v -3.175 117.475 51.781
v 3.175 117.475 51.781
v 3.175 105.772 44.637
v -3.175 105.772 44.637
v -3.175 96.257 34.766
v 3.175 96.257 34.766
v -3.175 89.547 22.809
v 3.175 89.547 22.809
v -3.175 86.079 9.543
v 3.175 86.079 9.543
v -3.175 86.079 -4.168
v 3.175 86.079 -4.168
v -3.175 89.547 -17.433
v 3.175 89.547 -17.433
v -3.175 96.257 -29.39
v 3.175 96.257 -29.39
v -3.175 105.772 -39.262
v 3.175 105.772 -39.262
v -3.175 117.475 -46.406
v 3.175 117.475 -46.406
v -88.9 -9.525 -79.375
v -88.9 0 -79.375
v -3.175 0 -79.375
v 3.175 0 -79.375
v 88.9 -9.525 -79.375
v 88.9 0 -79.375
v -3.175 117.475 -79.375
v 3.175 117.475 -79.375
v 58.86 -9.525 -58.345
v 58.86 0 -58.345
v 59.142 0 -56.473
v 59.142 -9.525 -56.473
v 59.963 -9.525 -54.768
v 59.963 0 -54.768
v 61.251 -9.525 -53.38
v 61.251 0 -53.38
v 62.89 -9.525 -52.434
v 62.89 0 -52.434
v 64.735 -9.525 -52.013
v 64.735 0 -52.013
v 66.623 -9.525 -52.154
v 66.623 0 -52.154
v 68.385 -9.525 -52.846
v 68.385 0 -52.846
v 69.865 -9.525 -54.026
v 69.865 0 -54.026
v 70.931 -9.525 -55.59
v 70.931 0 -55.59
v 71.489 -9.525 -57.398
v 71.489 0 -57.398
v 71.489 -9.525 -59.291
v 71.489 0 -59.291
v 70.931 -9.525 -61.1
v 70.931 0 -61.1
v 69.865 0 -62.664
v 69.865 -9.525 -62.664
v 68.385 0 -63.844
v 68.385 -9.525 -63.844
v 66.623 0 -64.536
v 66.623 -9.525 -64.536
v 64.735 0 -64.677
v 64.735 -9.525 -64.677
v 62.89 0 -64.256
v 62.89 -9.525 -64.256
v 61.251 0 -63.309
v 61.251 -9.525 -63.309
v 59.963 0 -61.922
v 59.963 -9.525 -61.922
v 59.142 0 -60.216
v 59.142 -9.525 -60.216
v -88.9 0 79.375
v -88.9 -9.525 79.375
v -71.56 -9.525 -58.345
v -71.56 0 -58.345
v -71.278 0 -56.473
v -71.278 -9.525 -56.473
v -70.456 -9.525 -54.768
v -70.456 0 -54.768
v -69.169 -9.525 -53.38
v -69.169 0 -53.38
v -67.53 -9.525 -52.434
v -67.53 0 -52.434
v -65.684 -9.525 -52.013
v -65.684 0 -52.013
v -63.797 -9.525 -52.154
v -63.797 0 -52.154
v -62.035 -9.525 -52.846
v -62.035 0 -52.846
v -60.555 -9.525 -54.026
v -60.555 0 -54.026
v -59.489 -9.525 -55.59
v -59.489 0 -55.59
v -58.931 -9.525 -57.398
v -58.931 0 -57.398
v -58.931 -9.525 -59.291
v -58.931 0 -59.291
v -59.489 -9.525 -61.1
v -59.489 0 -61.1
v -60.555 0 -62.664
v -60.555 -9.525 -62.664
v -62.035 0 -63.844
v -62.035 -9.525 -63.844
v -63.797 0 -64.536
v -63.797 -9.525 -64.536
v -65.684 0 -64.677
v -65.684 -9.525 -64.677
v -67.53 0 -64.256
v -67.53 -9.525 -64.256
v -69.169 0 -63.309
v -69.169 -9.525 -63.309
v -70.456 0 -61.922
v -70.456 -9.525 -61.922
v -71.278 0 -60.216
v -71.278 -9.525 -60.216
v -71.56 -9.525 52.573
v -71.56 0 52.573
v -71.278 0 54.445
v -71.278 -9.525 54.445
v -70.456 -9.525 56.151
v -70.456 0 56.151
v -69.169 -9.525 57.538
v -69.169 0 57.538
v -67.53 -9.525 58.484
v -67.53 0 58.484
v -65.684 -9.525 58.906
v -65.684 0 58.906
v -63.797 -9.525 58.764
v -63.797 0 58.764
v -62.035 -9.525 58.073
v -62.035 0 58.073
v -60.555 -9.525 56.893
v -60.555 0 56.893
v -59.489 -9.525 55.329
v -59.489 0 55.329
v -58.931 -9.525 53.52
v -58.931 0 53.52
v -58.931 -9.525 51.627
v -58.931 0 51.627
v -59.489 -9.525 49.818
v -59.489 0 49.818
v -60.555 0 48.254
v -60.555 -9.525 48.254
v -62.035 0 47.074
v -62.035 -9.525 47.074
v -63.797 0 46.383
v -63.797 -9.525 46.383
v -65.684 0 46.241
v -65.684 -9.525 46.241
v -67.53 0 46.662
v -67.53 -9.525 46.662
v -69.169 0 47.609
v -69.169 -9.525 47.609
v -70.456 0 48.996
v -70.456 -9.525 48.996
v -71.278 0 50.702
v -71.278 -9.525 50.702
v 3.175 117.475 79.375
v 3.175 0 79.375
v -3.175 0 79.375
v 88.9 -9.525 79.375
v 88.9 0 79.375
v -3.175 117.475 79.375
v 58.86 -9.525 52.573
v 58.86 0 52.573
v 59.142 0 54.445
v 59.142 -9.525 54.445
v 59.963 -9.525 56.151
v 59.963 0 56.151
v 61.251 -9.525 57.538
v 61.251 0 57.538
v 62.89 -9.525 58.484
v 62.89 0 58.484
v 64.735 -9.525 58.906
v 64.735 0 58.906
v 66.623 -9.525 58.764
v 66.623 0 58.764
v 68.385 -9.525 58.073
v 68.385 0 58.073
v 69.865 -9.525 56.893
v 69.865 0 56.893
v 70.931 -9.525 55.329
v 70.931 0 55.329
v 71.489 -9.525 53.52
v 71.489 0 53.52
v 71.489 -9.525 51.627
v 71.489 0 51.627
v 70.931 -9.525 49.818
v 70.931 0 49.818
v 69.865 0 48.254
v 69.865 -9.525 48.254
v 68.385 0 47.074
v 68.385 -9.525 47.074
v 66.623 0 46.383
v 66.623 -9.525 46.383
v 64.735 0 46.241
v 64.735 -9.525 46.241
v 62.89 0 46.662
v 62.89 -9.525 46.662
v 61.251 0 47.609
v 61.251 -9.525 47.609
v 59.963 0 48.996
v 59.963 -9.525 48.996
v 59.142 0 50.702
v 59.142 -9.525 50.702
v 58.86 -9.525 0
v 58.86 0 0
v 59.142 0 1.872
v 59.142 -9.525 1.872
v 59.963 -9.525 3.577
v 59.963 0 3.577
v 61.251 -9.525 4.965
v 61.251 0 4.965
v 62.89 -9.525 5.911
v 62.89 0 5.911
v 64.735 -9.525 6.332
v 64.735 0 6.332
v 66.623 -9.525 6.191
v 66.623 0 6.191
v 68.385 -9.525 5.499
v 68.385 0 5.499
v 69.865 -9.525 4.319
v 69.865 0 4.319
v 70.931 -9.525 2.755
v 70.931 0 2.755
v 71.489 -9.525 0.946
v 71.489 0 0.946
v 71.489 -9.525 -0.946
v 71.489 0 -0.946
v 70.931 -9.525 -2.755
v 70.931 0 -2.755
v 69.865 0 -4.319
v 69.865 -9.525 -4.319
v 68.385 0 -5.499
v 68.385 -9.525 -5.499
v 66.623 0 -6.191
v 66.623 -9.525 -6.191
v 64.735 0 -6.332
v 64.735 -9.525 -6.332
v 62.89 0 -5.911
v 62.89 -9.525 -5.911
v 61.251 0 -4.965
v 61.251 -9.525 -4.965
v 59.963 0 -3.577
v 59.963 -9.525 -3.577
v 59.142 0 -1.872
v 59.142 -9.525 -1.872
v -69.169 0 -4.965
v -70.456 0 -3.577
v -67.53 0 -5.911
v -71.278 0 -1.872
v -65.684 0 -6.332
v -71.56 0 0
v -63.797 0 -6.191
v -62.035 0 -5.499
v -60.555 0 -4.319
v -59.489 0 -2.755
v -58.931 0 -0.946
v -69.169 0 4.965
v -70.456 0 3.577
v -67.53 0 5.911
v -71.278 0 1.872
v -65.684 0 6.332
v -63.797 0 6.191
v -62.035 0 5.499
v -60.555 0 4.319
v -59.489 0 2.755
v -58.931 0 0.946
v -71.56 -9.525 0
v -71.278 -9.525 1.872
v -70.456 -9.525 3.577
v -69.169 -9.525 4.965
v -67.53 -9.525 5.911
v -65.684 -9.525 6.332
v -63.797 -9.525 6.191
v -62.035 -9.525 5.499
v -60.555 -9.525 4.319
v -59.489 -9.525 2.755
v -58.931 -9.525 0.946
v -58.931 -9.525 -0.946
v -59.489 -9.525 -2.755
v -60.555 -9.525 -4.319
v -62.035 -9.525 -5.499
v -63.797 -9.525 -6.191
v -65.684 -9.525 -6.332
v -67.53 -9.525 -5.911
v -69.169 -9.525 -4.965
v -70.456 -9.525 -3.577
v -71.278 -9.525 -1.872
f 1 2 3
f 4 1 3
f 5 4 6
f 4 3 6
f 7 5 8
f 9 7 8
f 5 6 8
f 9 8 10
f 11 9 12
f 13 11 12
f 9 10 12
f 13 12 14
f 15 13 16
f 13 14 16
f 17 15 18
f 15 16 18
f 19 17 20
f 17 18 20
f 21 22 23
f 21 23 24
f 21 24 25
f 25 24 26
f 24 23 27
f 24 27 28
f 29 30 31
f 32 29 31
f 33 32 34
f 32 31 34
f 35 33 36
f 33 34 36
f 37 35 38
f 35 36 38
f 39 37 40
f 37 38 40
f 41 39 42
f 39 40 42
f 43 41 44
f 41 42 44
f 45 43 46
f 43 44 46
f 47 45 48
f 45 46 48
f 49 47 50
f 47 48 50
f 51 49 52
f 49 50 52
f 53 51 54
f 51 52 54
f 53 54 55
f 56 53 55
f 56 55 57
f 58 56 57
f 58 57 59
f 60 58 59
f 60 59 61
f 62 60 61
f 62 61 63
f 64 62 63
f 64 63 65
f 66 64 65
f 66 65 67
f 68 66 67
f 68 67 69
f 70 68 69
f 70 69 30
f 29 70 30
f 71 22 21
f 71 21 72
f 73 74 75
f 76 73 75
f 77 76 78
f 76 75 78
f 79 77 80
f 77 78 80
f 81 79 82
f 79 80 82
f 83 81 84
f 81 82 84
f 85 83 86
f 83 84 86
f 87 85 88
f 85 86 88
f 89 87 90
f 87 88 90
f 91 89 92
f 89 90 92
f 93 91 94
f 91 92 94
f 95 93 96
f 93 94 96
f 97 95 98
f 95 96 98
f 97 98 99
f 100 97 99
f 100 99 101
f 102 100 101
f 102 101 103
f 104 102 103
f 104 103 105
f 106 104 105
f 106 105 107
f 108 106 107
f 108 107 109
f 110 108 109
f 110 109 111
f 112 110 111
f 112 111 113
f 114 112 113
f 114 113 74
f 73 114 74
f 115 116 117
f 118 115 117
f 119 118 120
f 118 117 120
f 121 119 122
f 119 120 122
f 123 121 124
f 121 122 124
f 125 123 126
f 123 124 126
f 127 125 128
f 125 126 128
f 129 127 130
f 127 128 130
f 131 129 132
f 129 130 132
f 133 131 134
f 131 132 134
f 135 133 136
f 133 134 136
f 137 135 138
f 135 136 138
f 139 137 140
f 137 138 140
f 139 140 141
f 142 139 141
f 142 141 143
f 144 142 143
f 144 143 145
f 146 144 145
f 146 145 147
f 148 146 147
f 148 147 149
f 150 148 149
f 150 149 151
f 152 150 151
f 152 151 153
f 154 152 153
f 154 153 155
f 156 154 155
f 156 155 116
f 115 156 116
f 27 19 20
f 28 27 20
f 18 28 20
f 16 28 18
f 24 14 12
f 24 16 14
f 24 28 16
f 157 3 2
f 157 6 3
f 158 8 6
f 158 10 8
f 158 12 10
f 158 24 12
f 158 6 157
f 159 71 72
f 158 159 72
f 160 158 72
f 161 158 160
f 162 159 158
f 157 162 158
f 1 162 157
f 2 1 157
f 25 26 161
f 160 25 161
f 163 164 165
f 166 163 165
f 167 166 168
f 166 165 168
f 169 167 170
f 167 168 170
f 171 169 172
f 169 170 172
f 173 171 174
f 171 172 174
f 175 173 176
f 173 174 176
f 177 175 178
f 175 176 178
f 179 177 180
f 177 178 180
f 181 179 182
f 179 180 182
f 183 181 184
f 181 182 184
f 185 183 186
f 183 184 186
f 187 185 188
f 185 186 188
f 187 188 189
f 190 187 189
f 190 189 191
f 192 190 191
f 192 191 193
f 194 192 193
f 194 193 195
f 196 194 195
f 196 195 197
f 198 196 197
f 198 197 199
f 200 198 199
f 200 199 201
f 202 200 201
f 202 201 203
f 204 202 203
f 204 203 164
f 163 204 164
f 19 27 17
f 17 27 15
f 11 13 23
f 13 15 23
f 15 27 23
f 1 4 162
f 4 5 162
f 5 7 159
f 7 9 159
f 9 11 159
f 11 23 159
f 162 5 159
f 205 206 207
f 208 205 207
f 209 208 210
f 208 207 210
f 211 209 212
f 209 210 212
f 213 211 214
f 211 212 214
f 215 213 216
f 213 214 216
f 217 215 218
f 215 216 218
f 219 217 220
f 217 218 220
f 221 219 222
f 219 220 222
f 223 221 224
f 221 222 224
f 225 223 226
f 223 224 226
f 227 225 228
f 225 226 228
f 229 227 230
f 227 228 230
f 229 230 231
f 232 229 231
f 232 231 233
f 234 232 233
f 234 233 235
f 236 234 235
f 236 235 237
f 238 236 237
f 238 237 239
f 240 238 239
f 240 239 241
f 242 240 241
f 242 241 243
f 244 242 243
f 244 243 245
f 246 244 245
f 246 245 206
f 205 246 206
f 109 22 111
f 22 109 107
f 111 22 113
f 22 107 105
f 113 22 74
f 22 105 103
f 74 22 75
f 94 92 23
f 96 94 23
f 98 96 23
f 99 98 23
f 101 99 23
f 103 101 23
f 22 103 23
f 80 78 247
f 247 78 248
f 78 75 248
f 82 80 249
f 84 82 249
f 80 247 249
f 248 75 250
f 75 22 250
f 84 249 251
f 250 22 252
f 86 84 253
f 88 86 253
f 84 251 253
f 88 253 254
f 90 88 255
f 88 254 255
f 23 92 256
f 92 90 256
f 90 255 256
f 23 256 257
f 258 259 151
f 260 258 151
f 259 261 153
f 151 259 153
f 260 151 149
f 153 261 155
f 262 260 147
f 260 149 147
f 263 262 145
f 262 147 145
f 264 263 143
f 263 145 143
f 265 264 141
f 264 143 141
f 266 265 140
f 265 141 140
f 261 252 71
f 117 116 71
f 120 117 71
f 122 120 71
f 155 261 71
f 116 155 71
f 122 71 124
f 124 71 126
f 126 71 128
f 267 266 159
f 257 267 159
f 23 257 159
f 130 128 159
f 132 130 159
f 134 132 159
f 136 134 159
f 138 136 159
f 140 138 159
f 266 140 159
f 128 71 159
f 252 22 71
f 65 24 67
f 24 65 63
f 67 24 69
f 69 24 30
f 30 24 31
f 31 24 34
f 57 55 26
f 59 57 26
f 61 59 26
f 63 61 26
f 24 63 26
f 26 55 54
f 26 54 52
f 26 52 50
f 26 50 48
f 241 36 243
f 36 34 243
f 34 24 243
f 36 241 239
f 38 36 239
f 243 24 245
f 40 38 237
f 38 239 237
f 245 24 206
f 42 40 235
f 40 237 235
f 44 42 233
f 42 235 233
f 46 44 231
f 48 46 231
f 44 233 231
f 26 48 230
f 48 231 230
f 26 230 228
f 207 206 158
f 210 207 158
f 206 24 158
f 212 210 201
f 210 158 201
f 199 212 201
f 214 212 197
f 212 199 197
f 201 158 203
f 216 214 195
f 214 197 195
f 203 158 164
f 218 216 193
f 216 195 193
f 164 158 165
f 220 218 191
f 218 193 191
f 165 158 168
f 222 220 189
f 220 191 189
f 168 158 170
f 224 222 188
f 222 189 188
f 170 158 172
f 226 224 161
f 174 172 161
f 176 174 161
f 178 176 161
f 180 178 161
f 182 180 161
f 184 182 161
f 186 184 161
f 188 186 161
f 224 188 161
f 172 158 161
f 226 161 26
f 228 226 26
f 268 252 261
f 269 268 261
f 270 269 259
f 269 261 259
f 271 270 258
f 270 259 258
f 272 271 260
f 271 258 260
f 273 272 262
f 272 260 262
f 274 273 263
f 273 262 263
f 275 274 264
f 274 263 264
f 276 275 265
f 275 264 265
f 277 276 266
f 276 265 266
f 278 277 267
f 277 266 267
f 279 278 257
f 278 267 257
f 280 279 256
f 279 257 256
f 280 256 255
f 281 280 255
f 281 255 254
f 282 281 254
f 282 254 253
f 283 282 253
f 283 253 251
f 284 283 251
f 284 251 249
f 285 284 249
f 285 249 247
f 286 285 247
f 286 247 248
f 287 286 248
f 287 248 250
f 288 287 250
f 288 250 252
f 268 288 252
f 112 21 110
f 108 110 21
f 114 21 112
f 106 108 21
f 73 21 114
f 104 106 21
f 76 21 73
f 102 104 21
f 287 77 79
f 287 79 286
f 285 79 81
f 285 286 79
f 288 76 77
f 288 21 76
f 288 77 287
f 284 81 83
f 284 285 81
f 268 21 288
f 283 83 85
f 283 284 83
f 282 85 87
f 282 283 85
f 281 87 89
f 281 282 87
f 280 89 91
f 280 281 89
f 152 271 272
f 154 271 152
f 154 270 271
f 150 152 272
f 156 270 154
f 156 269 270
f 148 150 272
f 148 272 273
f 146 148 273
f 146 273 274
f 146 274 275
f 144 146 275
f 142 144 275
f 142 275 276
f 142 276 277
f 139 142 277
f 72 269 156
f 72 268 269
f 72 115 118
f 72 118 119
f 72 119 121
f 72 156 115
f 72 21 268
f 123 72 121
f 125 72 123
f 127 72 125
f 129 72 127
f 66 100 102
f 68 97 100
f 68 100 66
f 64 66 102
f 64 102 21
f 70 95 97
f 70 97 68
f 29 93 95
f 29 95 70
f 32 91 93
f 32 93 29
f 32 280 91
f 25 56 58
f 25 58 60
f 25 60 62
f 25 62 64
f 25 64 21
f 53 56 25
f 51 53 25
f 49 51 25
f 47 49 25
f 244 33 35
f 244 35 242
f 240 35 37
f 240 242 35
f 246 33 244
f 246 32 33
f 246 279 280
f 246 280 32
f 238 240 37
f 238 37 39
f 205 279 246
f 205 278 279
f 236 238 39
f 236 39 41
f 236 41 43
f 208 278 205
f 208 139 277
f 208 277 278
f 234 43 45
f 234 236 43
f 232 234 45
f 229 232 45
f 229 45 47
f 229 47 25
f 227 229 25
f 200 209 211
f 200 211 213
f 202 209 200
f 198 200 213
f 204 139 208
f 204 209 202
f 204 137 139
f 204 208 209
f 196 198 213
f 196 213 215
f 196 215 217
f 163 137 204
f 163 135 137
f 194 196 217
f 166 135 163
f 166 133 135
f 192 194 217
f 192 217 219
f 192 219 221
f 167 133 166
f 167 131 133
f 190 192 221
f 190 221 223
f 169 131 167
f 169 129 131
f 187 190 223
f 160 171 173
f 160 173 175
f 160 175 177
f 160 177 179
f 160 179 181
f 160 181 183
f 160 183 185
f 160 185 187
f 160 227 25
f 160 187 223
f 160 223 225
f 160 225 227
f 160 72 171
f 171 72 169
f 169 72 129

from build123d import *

# Parameters (mm, degrees)
F0_W     = 177.8
F0_H     = 158.75
F1_DEPTH = 9.525
F2_W     = 6.35
F2_H     = 158.75
F3_DEPTH = 127
F5_DEPTH = 25.4
F6_R     = 6.35
F7_DEPTH = 25.4


# Not quite as in the source:
# - a length typed as a fraction of an inch, garbled in the dataset ("3 / 203.2 mm" for 3/8 in), is restored


with BuildPart() as f1:
    # F0 (on Front) → F1 (new body)
    with BuildSketch(Plane.XZ):
        Rectangle(F0_W, F0_H)
    extrude(amount=F1_DEPTH)

    # F2 (on face) → F3 (join)
    with BuildSketch(Plane.XZ.offset(9.525)):
        Rectangle(F2_W, F2_H)
    extrude(amount=-F3_DEPTH)

    # F4 (on face) → F5 (cut)
    with BuildSketch(Plane.YZ.offset(3.175)):
        with BuildLine():
            Line((117.475, -46.4056618512), (117.475, 51.7811893811))
            ThreePointArc((117.475, 51.7811893811), (85.640429463, 2.687763765), (117.475, -46.4056618512))
        make_face()
    extrude(amount=-F5_DEPTH, mode=Mode.SUBTRACT)

    # F6 (on face) → F7 (cut)
    with BuildSketch(Plane(origin=(0, 0, 0), x_dir=(-1, 0, 0), z_dir=(0, 1, 0))):
        with Locations((-65.2098059654, 52.5734424591)):
            Circle(F6_R)
        with Locations((-65.2098059654, 0)):
            Circle(F6_R)
        with Locations((-65.2098059654, -58.3447776735)):
            Circle(F6_R)
        with Locations((65.2098059654, -58.3447776735)):
            Circle(F6_R)
        with Locations((65.2098059654, 0)):
            Circle(F6_R)
        with Locations((65.2098059654, 52.5734424591)):
            Circle(F6_R)
    extrude(amount=-F7_DEPTH, mode=Mode.SUBTRACT)


solid = f1.part
